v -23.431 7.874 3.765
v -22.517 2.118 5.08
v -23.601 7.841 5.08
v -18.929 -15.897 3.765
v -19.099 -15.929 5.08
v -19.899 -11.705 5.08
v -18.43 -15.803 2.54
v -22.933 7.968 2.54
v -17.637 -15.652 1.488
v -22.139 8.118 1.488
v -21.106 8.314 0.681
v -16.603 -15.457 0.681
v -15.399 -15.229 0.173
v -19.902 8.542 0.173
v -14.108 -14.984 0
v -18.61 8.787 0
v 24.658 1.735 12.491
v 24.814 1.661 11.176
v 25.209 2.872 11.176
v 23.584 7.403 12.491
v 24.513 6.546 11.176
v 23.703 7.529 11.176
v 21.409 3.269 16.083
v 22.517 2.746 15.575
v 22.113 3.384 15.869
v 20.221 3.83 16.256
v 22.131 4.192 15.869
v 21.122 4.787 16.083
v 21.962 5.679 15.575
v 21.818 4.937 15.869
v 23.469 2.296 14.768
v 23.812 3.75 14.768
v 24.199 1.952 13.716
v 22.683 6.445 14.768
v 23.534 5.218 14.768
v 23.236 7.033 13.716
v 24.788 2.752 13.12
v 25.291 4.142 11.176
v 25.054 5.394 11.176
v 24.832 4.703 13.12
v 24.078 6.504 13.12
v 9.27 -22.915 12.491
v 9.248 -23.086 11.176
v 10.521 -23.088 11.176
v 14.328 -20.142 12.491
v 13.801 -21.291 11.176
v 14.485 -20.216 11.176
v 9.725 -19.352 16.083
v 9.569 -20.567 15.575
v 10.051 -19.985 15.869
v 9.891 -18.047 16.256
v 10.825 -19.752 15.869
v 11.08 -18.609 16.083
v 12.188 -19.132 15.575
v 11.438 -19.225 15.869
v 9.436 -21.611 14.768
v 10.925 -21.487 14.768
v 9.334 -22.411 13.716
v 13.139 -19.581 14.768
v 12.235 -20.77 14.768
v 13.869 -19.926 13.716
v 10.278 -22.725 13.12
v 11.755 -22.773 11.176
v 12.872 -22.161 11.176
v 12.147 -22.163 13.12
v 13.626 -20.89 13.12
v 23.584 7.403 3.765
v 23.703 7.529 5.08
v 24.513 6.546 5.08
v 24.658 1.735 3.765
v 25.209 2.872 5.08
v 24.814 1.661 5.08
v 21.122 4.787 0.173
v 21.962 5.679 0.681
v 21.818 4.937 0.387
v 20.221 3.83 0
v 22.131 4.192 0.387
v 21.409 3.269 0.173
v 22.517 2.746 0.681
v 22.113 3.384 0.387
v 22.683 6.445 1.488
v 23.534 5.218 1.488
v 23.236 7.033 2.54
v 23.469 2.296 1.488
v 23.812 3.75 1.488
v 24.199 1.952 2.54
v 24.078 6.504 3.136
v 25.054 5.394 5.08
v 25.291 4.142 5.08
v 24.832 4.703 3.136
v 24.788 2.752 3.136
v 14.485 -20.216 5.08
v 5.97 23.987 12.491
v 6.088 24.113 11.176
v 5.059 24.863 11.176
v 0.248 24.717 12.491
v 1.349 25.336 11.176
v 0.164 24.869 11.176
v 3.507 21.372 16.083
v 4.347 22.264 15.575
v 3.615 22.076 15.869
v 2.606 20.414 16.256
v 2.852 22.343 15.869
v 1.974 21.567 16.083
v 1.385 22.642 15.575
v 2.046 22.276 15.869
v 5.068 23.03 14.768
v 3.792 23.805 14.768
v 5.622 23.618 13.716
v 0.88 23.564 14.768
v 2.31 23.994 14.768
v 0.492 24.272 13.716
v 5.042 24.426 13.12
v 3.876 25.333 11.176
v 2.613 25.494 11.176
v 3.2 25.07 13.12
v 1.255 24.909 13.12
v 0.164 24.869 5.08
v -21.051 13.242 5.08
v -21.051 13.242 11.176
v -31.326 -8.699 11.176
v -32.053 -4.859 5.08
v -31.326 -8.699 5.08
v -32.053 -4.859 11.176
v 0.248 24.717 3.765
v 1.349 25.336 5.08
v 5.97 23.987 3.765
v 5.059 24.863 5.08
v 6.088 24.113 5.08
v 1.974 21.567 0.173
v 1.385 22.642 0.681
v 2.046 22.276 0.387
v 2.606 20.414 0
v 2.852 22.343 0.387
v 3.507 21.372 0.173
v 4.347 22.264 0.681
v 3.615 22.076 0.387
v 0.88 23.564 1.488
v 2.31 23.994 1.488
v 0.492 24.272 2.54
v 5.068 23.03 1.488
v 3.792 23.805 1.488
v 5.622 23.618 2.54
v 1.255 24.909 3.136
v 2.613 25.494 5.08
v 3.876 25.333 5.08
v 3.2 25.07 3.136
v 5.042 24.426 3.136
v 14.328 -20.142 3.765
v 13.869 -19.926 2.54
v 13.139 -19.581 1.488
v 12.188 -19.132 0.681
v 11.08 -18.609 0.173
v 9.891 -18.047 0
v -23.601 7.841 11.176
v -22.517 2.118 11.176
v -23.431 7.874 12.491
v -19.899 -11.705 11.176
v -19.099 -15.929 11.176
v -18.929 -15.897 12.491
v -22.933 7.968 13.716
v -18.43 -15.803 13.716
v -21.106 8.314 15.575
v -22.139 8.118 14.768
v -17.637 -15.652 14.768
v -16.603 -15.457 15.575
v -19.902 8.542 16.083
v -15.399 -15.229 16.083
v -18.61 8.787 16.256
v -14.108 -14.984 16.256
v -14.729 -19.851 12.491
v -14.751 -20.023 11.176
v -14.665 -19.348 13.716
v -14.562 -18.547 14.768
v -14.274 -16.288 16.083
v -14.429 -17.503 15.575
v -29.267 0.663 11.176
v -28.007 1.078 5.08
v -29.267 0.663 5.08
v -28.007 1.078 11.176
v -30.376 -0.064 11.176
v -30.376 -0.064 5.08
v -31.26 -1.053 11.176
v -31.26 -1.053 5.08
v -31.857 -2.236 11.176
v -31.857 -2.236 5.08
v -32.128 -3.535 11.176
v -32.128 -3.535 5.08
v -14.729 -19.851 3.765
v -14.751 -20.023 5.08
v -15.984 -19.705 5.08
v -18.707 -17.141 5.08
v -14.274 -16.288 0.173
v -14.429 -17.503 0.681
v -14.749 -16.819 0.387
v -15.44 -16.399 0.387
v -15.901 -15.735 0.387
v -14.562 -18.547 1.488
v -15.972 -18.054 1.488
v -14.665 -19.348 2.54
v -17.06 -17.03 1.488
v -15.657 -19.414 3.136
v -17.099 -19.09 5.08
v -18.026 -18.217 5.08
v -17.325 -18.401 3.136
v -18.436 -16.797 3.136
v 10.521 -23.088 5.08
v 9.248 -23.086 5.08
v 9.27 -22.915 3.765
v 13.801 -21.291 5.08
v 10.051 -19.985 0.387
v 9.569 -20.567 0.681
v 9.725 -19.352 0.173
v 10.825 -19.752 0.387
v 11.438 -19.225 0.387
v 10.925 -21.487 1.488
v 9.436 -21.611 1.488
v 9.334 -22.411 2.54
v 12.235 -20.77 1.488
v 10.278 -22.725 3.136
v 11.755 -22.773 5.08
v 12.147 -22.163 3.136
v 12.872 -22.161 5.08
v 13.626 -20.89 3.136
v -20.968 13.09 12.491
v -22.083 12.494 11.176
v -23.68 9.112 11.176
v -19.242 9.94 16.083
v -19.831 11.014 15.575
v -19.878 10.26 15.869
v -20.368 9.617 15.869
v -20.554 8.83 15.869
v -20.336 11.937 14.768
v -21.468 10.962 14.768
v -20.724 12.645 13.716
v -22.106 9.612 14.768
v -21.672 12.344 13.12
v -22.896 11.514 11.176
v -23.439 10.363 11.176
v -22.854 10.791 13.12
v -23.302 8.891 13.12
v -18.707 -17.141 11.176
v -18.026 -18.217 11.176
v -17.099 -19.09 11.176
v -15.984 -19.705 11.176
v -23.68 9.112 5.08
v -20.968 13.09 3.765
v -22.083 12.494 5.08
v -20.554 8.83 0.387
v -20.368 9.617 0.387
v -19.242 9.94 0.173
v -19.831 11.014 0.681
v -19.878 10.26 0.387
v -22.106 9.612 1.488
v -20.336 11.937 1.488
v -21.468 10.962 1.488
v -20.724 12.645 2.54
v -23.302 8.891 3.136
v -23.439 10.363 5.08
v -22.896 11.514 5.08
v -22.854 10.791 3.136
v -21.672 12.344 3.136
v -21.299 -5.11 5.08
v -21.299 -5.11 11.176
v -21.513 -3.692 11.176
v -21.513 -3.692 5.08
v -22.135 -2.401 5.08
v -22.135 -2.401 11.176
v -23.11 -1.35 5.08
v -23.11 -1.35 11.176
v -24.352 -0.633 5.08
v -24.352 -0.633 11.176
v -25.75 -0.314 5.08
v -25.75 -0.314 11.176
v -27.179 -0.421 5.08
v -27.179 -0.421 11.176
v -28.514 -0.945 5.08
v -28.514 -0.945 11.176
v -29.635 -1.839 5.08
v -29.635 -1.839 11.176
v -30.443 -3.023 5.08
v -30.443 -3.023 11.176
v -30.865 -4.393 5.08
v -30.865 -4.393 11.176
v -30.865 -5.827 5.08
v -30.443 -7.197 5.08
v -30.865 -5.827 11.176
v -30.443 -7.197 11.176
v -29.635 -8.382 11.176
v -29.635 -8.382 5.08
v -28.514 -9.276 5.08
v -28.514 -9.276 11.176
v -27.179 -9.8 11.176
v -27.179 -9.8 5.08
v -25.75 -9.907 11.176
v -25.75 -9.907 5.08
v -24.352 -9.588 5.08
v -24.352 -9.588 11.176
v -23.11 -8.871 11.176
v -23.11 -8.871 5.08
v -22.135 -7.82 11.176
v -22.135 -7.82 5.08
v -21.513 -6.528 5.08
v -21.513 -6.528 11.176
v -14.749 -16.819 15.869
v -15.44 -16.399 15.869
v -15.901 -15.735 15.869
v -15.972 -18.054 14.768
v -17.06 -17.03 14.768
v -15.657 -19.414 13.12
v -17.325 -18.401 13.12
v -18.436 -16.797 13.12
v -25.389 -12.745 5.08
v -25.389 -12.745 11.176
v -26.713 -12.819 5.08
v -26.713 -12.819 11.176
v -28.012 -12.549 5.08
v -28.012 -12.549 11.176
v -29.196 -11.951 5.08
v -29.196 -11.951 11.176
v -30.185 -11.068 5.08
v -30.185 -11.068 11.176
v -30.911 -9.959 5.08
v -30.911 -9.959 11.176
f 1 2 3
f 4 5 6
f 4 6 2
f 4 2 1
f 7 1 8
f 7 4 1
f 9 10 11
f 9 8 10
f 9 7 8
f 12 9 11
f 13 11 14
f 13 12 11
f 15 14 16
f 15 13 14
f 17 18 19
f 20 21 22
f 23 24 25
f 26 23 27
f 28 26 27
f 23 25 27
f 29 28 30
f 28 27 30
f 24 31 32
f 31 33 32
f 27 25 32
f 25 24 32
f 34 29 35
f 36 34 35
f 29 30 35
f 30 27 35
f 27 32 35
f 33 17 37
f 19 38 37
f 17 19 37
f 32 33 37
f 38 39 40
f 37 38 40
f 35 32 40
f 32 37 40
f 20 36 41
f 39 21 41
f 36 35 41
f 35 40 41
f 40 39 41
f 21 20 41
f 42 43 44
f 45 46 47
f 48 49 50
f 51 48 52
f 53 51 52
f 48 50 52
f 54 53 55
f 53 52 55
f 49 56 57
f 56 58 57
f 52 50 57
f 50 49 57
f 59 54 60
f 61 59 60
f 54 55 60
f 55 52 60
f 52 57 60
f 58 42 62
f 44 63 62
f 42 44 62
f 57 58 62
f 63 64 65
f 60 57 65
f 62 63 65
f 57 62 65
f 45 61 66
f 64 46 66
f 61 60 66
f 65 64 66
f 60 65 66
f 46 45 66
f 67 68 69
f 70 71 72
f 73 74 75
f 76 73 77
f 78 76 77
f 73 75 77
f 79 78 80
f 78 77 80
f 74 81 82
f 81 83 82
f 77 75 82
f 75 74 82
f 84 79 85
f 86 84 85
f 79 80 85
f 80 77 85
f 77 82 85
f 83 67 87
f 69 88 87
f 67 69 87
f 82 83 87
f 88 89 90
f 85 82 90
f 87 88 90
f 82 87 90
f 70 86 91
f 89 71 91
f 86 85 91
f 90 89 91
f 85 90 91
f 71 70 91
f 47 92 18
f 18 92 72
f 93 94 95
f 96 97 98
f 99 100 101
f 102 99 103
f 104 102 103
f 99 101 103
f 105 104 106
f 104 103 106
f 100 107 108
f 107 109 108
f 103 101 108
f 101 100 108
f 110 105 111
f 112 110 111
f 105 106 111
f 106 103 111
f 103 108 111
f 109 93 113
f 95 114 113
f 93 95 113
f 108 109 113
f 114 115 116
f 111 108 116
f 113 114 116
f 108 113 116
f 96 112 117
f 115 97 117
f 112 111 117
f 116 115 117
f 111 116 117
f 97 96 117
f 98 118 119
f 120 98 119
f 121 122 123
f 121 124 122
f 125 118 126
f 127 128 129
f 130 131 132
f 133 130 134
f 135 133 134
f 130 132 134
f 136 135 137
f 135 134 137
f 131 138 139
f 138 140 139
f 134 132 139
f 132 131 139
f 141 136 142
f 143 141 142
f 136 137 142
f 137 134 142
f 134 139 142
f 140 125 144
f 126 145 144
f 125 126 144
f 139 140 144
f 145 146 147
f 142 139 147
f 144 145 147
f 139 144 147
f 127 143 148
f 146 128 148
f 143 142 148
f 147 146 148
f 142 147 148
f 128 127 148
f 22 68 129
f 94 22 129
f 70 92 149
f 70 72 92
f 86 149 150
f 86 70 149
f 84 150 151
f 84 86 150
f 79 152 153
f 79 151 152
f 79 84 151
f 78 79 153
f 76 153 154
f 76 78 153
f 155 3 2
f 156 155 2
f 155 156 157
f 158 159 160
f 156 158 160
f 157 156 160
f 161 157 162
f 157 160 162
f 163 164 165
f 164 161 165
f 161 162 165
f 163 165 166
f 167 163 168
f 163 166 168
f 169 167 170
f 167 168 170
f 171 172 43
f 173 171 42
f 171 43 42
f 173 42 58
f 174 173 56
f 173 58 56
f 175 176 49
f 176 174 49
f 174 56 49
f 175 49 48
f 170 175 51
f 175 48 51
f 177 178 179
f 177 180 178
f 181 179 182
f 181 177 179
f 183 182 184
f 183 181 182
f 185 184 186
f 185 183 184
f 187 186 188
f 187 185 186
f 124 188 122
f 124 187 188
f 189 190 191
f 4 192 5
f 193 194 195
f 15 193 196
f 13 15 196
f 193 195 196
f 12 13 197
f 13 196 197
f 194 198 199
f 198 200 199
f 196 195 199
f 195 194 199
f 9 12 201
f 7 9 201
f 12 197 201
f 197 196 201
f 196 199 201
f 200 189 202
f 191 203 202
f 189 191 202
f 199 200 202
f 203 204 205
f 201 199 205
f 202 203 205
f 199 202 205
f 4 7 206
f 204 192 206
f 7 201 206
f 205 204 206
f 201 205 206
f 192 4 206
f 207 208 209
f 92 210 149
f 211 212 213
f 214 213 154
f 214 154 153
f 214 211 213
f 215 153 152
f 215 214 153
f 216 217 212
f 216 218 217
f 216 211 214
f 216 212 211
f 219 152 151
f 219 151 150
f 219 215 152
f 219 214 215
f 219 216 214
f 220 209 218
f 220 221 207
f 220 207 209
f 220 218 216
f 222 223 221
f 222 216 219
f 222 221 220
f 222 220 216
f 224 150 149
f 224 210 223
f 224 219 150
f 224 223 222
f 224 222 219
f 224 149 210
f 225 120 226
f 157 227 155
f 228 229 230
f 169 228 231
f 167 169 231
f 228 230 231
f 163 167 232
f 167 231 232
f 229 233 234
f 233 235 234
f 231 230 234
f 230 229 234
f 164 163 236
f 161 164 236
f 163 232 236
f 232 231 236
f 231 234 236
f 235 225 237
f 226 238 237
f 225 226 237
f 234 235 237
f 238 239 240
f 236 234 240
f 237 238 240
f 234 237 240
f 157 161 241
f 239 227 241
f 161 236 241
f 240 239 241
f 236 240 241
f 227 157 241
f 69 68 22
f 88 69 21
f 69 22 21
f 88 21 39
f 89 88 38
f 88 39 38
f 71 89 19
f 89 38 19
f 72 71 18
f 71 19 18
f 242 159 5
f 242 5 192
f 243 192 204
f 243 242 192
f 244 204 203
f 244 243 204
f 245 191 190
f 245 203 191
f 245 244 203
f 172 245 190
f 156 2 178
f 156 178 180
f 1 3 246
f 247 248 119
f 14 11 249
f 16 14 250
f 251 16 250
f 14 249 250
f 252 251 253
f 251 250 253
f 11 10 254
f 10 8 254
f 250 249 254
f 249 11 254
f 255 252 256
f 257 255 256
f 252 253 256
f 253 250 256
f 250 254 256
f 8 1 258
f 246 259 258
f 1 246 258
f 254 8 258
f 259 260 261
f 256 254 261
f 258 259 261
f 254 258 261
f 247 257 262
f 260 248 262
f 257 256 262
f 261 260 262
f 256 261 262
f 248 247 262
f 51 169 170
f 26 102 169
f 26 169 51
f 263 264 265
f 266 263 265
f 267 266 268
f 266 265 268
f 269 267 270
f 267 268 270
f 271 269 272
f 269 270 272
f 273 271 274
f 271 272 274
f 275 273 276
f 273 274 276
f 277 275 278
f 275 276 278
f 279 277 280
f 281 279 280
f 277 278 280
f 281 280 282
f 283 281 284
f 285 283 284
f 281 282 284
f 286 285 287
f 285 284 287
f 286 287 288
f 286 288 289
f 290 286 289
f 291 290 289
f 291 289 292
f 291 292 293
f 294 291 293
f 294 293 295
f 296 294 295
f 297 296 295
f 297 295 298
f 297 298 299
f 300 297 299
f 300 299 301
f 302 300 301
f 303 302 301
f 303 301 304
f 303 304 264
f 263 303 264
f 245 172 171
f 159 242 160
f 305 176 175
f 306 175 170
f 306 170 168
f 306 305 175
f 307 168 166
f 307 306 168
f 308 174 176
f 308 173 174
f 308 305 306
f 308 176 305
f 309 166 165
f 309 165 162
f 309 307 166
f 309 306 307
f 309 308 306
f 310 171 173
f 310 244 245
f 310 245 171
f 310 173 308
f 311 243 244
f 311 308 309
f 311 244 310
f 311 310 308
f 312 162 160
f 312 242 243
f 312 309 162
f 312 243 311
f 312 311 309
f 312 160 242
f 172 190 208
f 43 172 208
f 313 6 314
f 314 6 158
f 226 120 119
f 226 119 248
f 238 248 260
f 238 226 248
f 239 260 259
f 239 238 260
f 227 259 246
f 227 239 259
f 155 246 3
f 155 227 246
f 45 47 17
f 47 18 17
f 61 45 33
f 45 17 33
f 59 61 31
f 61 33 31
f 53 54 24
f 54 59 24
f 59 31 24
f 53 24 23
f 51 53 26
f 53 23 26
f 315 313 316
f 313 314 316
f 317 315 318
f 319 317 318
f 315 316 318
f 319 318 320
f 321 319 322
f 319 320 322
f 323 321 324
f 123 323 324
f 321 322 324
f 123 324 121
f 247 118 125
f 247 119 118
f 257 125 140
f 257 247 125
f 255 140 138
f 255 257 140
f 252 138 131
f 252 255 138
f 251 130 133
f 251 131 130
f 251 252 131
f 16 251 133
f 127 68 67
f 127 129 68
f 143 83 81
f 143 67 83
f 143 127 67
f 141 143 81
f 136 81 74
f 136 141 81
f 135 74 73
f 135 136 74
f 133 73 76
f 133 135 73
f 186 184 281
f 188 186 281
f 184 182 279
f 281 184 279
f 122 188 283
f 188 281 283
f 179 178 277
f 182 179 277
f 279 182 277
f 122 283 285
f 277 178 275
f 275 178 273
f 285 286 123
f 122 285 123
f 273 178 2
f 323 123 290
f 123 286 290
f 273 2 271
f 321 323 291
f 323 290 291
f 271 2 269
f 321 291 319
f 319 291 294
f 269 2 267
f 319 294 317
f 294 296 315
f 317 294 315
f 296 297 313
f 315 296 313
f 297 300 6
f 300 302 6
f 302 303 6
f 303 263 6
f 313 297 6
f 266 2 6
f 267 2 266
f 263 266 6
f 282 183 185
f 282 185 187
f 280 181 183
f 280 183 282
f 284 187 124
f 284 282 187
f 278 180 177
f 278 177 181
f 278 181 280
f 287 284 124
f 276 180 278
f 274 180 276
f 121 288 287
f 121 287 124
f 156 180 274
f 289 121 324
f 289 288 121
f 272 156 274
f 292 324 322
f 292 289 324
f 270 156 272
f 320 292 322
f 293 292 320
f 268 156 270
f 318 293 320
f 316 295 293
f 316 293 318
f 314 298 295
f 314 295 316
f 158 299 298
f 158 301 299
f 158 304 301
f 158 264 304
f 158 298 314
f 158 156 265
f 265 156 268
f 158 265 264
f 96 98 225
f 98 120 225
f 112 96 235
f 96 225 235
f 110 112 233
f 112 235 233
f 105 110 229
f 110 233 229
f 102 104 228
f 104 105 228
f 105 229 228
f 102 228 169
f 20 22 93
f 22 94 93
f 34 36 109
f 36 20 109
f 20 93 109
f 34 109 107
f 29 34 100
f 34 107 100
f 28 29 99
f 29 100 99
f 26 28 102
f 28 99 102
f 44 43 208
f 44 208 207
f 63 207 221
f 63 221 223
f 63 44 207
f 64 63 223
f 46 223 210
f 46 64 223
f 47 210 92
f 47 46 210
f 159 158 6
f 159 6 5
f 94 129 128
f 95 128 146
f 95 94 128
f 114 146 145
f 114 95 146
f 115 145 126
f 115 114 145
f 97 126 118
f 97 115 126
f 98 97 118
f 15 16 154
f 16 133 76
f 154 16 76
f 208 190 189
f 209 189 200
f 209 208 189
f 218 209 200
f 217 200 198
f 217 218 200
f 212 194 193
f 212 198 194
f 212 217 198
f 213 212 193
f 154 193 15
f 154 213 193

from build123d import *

# Parameters (mm, degrees)
F1_DEPTH = 16.256
F2_R     = 5.08
F3_W     = 14.0684605576
F3_H     = 6.096
F4_DEPTH = 10.668
F5_R     = 5.08
F6_R     = 4.8101644532
F7_DEPTH = 25.4


with BuildPart() as f1:
    # F0 (on Top) → F1 (new body)
    with BuildSketch(Plane.XY):
        Polygon((26.3900562345, 4.9985722308), (3.4010511667, 26.6430787142), (-24.288091016, 11.4677559795), (-18.4119169365, -19.5556157441), (12.9089005512, -23.5537911803), align=None)
    extrude(amount=F1_DEPTH)

    # F2
    f2_edges = [f1.edges().sort_by_distance(p)[0] for p in [
        (-18.411917, -19.555616, 8.128),
        (-2.751508, -21.554703, 0),
        (-2.751508, -21.554703, 16.256),
        (-21.350004, -4.04393, 0),
        (-10.44352, 19.055417, 0),
        (14.895554, 15.820825, 0),
        (19.649478, -9.277609, 0),
        (19.649478, -9.277609, 16.256),
        (14.895554, 15.820825, 16.256),
        (-10.44352, 19.055417, 16.256),
        (-21.350004, -4.04393, 16.256),
        (3.401051, 26.643079, 8.128),
        (-24.288091, 11.467756, 8.128),
        (12.908901, -23.553791, 8.128),
        (26.390056, 4.998572, 8.128),
    ]]
    fillet(f2_edges, radius=F2_R)

    # F3 (on face) → F4 (join)
    with BuildSketch(Plane(origin=(-21.3500039762, -4.0439298823, 0), x_dir=(0.1861022589, -0.9825303808, 0), z_dir=(-0.9825303808, -0.1861022589, 0))):
        with Locations((0.7629252505, 8.128)):
            Rectangle(F3_W, F3_H)
    extrude(amount=F4_DEPTH)

    # F5
    f5_edges = [f1.edges().sort_by_distance(p)[0] for p in [
        (-30.38057, -13.690211, 8.128),
        (-32.998742, 0.132479, 8.128),
    ]]
    fillet(f5_edges, radius=F5_R)

    # F6 (on face) → F7 (cut)
    with BuildSketch(Plane.XY.offset(11.176)):
        with Locations((-26.1089652777, -5.1103131846)):
            Circle(F6_R)
    extrude(amount=-F7_DEPTH, mode=Mode.SUBTRACT)


solid = f1.part
